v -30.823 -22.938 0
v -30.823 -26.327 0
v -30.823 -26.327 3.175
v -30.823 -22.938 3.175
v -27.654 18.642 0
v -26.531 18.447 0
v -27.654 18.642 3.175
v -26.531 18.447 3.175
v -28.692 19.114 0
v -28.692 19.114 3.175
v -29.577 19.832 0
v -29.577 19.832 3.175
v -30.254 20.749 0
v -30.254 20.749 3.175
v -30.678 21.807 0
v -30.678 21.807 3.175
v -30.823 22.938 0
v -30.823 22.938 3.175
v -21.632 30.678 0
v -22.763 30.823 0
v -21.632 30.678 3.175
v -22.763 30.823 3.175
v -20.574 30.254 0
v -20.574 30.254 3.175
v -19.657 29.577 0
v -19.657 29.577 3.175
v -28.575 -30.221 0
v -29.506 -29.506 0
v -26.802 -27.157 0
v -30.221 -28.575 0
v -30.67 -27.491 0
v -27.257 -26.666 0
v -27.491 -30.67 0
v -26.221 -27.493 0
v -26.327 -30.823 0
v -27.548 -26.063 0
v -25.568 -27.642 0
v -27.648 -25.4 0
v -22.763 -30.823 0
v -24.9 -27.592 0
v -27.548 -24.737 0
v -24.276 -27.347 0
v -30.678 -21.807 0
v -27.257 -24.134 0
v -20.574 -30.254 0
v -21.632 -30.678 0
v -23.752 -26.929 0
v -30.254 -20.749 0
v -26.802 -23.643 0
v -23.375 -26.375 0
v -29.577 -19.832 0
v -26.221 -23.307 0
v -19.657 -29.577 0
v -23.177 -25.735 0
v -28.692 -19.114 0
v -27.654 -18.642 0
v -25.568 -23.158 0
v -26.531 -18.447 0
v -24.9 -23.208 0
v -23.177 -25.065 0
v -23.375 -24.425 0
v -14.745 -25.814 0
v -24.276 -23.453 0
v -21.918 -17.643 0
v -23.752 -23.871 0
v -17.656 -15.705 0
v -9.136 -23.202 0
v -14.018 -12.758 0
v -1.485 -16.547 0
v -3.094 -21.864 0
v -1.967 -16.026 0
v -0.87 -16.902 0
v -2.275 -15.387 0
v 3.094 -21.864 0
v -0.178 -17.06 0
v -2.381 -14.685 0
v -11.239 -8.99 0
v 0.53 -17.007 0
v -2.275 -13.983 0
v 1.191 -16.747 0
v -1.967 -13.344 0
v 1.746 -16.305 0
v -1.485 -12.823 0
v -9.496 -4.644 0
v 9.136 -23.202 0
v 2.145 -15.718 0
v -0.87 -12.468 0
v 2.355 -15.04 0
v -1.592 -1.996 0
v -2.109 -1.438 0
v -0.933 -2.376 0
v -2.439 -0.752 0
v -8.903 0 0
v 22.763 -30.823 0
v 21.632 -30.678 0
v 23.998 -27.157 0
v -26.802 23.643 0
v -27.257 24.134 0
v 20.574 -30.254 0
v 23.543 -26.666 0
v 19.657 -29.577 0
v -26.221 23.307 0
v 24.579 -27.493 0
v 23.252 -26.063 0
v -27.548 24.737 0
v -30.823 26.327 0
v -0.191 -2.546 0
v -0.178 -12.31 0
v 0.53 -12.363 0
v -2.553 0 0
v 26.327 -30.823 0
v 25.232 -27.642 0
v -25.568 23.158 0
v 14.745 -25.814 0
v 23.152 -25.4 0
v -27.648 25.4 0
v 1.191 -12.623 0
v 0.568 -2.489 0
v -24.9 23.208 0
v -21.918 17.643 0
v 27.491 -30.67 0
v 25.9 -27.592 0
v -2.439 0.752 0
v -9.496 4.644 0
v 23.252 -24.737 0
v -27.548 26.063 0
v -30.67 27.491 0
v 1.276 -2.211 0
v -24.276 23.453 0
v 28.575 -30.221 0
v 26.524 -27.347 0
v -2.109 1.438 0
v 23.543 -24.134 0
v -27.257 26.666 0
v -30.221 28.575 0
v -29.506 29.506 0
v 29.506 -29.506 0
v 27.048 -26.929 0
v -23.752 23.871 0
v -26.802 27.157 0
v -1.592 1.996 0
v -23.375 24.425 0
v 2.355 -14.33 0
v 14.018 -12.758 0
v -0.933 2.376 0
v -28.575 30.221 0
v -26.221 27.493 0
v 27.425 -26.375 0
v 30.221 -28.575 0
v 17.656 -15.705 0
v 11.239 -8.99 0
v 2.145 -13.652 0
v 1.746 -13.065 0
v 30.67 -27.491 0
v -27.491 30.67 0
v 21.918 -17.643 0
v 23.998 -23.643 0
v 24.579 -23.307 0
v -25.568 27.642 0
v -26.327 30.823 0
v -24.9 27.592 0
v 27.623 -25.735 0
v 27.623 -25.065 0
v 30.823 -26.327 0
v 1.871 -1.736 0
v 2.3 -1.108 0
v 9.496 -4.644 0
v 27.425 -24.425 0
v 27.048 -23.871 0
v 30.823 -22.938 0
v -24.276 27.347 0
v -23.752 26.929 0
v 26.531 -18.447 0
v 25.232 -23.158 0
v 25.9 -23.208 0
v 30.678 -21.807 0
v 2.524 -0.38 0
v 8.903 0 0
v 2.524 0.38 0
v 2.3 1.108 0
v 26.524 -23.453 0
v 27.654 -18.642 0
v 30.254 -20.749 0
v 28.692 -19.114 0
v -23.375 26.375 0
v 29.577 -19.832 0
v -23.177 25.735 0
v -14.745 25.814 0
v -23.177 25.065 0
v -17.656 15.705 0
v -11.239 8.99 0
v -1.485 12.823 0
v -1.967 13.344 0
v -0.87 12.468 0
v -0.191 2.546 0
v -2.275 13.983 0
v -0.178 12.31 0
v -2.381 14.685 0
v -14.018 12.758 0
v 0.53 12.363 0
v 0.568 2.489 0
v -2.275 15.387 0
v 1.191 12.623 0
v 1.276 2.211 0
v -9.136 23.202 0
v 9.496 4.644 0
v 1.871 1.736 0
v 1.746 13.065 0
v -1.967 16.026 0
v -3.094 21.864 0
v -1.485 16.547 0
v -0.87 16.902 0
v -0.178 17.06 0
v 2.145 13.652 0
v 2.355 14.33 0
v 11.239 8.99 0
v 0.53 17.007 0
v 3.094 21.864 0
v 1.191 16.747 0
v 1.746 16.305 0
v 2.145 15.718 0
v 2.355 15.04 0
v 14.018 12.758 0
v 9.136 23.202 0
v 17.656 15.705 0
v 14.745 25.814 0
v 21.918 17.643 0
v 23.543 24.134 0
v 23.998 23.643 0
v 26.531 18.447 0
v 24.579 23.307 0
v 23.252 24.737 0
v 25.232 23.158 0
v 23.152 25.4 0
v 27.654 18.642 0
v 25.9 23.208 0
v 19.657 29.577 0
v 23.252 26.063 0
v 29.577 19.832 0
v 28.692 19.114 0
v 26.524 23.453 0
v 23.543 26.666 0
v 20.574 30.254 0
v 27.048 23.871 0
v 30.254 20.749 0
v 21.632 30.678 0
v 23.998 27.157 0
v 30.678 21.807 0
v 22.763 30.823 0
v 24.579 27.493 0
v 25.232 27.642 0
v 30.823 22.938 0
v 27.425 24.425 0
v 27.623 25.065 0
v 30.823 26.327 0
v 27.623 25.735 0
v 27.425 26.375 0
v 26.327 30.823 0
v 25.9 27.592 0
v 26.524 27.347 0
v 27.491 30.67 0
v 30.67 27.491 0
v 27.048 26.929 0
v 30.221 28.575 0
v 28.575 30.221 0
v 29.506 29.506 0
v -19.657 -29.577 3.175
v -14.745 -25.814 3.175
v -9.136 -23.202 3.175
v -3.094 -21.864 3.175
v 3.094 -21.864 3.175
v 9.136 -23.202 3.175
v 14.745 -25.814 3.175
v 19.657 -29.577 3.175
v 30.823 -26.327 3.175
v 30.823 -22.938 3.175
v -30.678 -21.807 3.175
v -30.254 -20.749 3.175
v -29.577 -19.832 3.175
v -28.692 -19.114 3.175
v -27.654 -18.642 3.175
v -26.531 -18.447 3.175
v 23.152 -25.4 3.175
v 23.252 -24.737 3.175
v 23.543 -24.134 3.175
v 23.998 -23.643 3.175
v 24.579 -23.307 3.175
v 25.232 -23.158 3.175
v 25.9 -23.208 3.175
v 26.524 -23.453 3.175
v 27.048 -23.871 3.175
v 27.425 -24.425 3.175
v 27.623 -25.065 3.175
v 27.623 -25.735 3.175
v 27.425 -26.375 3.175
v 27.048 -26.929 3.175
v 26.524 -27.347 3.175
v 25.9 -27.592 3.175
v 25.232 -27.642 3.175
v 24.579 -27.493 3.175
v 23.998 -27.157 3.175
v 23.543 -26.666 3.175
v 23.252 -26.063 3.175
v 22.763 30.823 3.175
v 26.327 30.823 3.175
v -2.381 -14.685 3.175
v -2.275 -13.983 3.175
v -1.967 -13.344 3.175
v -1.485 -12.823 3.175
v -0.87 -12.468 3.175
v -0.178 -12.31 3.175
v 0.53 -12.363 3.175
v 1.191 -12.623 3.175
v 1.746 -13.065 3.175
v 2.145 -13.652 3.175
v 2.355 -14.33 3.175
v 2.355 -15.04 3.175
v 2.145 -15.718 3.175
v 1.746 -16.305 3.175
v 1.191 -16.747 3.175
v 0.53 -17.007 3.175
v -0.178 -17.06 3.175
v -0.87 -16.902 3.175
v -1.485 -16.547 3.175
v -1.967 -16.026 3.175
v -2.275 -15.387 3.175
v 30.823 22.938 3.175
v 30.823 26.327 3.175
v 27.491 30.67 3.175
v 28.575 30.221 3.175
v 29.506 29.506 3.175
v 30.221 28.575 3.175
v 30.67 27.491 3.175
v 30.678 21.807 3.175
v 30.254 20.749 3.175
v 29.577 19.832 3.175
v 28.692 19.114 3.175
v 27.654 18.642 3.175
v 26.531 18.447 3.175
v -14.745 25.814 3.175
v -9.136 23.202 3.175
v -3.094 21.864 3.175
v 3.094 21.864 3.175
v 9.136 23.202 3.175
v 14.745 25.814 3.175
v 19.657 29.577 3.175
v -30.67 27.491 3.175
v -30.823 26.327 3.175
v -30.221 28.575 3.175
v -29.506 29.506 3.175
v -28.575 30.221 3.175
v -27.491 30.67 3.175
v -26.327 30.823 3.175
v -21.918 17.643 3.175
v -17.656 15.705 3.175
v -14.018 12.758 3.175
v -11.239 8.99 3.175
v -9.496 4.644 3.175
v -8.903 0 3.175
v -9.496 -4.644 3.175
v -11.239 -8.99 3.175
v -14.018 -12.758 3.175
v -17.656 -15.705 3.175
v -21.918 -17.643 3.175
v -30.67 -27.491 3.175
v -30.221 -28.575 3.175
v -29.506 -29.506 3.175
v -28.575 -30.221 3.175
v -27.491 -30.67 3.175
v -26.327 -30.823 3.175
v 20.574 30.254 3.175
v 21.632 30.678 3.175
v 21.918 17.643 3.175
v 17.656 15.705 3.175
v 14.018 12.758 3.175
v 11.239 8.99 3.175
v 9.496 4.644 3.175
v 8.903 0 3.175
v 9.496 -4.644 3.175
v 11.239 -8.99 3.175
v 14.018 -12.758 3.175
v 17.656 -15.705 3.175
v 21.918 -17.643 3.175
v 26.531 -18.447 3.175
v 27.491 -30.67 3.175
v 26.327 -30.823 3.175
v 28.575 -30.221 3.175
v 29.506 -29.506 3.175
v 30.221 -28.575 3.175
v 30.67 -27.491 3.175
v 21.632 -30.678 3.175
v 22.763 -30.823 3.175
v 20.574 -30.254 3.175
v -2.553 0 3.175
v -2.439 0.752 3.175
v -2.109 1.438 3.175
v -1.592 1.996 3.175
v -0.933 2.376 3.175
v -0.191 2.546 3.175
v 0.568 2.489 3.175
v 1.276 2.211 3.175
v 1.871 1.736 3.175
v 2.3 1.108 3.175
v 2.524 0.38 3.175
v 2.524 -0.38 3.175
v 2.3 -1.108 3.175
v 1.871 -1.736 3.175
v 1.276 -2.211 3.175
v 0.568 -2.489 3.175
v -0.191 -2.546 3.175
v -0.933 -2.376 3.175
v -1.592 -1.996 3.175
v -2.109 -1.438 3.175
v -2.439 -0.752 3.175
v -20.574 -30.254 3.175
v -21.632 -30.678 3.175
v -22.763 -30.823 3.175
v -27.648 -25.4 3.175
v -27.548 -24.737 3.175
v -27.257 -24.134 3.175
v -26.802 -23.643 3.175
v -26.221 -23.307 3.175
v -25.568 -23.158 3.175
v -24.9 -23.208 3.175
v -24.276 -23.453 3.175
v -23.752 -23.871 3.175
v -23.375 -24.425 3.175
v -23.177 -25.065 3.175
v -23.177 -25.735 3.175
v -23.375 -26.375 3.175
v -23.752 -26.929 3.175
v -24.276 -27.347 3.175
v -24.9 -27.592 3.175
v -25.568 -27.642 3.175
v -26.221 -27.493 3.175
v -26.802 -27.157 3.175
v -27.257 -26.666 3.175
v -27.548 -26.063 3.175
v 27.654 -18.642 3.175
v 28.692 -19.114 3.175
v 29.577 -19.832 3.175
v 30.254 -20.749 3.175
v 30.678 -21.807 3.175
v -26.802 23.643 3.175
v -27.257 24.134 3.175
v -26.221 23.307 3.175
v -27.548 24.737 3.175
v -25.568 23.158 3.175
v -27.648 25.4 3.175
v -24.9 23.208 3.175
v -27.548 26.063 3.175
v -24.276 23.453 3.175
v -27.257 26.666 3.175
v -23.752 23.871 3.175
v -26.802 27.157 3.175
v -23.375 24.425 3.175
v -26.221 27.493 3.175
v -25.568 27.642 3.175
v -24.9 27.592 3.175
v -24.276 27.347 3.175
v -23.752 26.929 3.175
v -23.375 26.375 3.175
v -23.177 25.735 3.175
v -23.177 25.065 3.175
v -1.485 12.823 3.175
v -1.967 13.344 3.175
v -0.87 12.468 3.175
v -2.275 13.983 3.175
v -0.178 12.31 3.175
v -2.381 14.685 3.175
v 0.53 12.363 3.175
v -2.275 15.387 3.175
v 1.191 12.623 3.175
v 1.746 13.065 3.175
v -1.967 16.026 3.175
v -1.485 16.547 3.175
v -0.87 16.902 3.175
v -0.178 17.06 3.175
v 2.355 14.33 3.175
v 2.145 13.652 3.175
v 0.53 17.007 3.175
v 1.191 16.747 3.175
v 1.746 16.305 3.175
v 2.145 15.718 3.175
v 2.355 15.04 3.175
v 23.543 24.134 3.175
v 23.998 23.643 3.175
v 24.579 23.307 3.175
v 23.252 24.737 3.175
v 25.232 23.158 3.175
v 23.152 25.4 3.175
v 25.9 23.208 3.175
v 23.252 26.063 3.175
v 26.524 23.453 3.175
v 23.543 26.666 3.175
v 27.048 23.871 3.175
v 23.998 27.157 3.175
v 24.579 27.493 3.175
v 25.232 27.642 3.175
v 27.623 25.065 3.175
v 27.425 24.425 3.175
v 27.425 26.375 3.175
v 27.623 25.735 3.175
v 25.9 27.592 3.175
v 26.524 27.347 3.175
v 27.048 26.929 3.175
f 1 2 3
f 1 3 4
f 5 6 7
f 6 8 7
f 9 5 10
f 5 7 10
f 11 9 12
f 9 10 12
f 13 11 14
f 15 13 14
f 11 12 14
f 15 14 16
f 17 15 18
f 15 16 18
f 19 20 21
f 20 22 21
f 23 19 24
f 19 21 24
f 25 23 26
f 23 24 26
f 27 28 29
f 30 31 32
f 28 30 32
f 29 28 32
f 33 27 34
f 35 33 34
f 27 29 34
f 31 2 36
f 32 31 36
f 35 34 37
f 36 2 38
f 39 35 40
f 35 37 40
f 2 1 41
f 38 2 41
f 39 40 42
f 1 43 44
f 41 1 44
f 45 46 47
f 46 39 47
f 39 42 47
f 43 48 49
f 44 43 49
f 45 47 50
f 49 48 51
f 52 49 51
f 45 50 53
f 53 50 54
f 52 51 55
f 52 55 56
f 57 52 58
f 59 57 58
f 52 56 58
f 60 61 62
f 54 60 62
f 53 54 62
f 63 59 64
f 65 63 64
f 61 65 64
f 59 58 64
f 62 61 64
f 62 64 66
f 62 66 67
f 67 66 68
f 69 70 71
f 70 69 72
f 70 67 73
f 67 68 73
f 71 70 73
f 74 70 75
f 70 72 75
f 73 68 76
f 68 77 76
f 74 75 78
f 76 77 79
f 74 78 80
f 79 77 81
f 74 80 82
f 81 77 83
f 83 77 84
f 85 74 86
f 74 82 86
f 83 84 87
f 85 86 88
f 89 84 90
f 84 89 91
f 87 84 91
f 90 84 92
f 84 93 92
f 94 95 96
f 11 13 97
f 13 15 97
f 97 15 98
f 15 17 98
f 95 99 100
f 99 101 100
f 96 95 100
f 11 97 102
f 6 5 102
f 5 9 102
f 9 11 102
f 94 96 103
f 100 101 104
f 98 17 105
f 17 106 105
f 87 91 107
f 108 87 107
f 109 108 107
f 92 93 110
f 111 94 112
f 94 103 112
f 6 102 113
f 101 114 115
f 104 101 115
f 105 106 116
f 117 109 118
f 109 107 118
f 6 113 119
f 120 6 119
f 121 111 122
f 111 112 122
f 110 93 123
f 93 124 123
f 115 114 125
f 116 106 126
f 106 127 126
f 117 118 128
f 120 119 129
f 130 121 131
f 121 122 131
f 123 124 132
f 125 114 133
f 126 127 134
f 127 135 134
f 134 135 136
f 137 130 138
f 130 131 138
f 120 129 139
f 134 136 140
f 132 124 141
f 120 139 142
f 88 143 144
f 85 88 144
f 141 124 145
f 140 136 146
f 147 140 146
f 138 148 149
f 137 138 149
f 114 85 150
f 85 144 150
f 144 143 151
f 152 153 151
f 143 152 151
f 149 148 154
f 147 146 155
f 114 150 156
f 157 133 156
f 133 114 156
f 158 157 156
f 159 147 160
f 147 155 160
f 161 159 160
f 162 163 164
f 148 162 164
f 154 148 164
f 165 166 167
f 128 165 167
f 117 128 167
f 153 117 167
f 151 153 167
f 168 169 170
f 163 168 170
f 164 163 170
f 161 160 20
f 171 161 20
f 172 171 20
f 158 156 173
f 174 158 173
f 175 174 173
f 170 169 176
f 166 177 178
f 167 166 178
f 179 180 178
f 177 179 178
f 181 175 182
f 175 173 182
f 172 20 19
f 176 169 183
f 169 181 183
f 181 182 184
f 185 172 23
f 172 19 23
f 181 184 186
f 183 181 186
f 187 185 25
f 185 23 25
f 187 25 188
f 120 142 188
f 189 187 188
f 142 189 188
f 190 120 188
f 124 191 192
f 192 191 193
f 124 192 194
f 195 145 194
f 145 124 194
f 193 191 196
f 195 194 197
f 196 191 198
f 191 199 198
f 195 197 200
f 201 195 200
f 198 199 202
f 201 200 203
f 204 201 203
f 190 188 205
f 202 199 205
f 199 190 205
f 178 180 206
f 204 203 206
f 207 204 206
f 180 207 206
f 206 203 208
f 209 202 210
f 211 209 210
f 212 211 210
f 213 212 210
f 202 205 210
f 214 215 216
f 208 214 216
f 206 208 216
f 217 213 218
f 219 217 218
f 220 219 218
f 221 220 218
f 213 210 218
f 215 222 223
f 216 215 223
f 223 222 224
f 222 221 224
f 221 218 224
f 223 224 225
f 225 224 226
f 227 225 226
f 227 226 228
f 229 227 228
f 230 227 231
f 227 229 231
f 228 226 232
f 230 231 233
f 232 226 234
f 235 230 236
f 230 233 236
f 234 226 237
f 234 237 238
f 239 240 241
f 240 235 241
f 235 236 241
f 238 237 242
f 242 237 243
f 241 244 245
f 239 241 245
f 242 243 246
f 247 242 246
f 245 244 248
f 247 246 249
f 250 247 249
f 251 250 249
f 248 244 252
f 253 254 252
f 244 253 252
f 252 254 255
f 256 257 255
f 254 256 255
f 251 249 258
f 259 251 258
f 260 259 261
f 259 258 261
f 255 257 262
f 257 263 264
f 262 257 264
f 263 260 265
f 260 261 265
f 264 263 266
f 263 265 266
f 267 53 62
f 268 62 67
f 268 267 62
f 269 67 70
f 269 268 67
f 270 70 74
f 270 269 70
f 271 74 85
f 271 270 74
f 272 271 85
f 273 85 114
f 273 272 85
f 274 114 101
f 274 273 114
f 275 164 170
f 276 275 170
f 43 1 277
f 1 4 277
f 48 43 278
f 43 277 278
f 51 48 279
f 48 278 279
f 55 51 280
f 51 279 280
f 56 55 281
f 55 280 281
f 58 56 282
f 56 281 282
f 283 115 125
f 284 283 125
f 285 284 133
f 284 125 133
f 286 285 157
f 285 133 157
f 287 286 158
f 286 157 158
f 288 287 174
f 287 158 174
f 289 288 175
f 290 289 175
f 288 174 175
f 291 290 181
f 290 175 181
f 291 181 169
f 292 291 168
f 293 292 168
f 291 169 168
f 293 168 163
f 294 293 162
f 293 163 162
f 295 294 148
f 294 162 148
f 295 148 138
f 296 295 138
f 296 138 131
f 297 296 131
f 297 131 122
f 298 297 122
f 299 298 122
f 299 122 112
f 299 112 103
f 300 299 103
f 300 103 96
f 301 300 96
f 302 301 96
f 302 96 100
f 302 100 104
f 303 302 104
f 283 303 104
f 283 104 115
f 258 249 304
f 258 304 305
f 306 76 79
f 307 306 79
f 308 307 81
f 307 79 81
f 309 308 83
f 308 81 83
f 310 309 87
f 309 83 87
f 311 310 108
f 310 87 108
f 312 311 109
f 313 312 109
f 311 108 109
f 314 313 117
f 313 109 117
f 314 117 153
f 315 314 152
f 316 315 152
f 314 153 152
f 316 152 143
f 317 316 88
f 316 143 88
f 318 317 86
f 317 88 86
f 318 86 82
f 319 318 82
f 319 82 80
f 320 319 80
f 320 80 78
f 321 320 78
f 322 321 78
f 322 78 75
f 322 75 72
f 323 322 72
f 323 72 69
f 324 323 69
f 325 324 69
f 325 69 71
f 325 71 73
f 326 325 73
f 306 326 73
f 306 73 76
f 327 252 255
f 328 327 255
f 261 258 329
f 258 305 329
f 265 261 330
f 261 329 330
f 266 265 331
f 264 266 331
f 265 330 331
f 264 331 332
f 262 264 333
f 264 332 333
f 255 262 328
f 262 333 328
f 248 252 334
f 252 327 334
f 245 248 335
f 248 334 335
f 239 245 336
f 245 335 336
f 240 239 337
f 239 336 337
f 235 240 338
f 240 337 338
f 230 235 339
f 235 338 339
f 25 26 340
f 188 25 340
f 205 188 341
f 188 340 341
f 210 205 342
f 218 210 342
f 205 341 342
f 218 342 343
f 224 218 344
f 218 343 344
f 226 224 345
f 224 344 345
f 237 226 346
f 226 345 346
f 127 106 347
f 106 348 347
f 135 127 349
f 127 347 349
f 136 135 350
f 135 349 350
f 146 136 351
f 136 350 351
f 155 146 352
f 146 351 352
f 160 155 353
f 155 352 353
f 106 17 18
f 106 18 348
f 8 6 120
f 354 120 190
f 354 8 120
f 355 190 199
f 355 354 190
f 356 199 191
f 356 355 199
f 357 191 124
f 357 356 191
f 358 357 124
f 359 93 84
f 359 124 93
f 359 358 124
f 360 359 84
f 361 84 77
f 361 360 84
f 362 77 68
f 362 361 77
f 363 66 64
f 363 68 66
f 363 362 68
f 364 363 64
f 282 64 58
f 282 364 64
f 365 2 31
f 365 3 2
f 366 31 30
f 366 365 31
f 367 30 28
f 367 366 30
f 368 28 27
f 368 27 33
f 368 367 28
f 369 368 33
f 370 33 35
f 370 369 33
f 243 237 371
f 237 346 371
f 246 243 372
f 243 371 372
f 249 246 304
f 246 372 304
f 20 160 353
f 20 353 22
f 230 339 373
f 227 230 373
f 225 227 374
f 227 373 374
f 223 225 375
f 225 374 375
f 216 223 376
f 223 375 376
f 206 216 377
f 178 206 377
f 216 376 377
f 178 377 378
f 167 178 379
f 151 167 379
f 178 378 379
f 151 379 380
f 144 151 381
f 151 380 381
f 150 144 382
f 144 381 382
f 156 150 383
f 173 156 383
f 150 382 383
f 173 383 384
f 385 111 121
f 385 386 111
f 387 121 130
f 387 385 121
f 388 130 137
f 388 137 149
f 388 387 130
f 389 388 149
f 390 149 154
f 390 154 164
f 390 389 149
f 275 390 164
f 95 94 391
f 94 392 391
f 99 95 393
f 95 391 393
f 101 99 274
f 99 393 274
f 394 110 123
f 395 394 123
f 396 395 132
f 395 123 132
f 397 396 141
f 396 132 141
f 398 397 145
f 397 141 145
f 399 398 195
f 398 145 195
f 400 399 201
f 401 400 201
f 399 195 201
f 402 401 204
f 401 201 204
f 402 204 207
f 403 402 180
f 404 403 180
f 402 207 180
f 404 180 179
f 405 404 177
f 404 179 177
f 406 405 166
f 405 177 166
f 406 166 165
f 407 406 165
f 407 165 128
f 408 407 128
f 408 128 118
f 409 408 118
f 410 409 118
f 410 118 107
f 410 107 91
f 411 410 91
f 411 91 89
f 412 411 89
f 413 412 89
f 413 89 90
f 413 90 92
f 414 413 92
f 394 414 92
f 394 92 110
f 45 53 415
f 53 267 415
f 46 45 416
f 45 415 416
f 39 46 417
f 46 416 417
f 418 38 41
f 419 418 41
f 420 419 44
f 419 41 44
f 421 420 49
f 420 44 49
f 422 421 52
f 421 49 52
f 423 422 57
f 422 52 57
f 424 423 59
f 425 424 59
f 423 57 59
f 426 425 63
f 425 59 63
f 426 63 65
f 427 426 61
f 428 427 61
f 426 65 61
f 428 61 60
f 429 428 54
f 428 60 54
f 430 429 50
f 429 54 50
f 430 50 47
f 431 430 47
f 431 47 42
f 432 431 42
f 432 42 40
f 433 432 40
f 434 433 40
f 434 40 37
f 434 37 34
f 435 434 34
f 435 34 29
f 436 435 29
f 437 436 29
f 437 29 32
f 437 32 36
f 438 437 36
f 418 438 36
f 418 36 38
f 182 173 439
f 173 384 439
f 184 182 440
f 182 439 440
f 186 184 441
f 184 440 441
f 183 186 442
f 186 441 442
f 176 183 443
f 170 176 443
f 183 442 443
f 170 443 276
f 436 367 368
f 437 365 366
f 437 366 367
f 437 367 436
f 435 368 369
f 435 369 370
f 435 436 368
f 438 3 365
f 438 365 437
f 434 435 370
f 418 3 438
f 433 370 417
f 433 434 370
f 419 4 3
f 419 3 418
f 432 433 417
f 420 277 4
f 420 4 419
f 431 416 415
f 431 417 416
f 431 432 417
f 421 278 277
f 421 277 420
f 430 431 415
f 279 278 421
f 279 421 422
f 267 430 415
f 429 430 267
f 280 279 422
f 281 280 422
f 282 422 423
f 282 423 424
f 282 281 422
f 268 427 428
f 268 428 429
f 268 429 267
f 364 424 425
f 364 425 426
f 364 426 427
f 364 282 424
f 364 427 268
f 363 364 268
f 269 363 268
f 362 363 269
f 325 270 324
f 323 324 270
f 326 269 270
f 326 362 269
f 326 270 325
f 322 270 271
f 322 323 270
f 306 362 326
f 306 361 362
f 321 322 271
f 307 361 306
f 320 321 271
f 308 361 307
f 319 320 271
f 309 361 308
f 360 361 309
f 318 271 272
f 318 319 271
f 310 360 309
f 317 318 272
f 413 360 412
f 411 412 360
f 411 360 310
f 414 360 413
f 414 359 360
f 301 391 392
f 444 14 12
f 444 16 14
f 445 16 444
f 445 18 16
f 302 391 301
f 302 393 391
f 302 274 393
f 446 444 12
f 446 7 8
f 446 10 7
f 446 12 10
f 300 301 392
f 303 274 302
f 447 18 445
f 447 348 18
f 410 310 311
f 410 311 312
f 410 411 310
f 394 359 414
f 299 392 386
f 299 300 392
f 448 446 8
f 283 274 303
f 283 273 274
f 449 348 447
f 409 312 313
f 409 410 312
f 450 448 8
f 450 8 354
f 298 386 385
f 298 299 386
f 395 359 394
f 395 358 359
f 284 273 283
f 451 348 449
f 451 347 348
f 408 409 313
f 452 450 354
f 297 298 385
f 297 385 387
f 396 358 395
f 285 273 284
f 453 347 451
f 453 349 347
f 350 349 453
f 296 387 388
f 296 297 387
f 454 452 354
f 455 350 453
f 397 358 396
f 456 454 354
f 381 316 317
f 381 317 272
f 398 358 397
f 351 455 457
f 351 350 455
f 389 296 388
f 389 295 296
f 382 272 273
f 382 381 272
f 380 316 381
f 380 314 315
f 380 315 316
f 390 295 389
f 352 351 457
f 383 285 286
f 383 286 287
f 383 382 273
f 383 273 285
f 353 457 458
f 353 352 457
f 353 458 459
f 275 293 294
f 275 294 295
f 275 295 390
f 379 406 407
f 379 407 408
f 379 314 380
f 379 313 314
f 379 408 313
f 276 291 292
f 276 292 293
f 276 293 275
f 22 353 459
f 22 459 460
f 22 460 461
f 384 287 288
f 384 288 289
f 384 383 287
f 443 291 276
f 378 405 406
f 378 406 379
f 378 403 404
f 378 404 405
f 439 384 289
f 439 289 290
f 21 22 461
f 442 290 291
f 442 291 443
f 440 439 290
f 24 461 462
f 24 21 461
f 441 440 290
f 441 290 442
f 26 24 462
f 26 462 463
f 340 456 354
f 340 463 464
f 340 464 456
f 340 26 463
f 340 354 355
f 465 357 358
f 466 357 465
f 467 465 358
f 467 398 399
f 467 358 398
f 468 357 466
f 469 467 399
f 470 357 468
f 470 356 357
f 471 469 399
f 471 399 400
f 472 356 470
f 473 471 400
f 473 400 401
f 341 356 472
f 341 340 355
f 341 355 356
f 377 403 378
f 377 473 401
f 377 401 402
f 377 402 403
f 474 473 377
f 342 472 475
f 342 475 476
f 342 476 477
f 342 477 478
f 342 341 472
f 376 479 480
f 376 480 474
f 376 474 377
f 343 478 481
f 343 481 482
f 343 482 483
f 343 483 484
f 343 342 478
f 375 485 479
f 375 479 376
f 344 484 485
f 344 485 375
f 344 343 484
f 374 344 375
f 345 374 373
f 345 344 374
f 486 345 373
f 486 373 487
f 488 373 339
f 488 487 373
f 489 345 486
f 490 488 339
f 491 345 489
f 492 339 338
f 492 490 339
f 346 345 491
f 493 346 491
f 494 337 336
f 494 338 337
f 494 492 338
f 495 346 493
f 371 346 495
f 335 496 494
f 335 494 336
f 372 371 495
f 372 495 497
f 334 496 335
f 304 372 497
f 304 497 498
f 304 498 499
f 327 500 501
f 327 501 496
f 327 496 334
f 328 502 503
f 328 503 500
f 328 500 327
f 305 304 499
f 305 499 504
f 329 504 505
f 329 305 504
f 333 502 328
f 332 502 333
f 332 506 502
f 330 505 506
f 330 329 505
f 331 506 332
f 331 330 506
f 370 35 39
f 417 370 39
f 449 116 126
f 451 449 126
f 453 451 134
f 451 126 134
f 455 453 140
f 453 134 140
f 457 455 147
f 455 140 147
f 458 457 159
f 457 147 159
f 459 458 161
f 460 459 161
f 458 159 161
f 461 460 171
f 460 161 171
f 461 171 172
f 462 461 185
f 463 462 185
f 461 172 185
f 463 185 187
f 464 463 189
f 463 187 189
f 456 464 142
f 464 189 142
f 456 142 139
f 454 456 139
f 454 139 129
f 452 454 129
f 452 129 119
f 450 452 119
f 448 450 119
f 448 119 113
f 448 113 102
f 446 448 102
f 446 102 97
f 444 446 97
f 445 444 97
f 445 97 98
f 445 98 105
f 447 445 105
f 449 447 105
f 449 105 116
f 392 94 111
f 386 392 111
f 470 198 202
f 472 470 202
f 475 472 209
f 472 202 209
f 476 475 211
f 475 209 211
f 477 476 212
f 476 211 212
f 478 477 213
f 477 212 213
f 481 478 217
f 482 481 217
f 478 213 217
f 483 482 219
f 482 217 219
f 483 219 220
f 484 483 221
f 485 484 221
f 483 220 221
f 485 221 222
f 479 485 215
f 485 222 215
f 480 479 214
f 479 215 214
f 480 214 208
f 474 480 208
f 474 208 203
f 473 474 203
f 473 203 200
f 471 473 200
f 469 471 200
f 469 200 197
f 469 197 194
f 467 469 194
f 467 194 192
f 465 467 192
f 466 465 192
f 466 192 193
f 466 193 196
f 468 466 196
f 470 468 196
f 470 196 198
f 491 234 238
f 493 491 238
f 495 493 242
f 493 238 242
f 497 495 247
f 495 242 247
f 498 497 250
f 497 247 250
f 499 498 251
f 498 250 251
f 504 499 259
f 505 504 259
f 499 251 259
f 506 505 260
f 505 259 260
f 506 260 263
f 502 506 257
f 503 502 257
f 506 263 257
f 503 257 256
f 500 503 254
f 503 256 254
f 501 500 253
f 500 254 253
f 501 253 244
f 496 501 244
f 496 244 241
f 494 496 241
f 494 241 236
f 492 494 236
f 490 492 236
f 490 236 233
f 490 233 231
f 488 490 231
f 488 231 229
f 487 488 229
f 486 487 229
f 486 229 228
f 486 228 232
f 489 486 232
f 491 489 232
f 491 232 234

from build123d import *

# Parameters (mm, degrees)
SKETCH1_W                      = 61.6458
SKETCH1_H                      = 61.6458
BOSS_EXTRUDE1_DEPTH            = 3.175
F_3_16_0_1875_DIAMETER_HOLE1_D = 4.7625
F_8_CLEARANCE_HOLE1_D          = 4.4958
F_10_CLEARANCE_HOLE2_D         = 5.1054
FILLET1_R                      = 4.4958
SKETCH9_R                      = 28.452559636
CUT_EXTRUDE2_DEPTH             = 4.175
SKETCH9_4_R                    = 18.465762264
CUT_EXTRUDE3_DEPTH             = 4.175
FILLET3_R                      = 4.4958


with BuildPart() as part:
    # Sketch1 → Boss-Extrude1 (new body)
    with BuildSketch(Plane.XY):
        Rectangle(SKETCH1_W, SKETCH1_H)
    extrude(amount=BOSS_EXTRUDE1_DEPTH)

    # 3/16 (0.1875) Diameter Hole1 (through all)
    with Locations(Plane.XY.offset(3.175)):
        with Locations((0, -14.685), (0, 14.685)):
            Hole(F_3_16_0_1875_DIAMETER_HOLE1_D / 2)

    # #8 Clearance Hole1 (through all)
    with Locations(Plane.XY.offset(3.175)):
        with Locations((-25.4, 25.4), (-25.4, -25.4), (25.4, -25.4), (25.4, 25.4)):
            Hole(F_8_CLEARANCE_HOLE1_D / 2)

    # #10 Clearance Hole2 (through all)
    with Locations(Plane.XY.offset(3.175)):
        with Locations((0, 0)):
            Hole(F_10_CLEARANCE_HOLE2_D / 2)

    # Fillet1
    fillet1_edges = [part.edges().sort_by_distance(p)[0] for p in [
        (-30.8229, 30.8229, 1.5875),
        (30.8229, 30.8229, 1.5875),
        (30.8229, -30.8229, 1.5875),
        (-30.8229, -30.8229, 1.5875),
    ]]
    fillet(fillet1_edges, radius=FILLET1_R)

    # Sketch9 → Cut-Extrude2 (cut, through all)
    with BuildSketch(Plane.XY.offset(3.175)):
        with Locations((0, 50.147959636)):
            Circle(SKETCH9_R)
    cut_extrude2 = extrude(amount=-CUT_EXTRUDE2_DEPTH, mode=Mode.SUBTRACT)

    # Sketch9<4> → Cut-Extrude3 (cut, through all)
    with BuildSketch(Plane.XY.offset(3.175)):
        with Locations((27.368462264, 0)):
            Circle(SKETCH9_4_R)
    cut_extrude3 = extrude(amount=-CUT_EXTRUDE3_DEPTH, mode=Mode.SUBTRACT)

    # Mirror1: Cut-Extrude2 across plane
    add(cut_extrude2.mirror(Plane.ZX), mode=Mode.SUBTRACT)

    # Mirror2: Cut-Extrude3 across plane
    add(cut_extrude3.mirror(Plane(origin=(0, 0, 0), x_dir=(0, 0, 1), z_dir=(1, 0, 0))), mode=Mode.SUBTRACT)

    # Fillet3
    fillet3_edges = [part.edges().sort_by_distance(p)[0] for p in [
        (-30.8229, 18.139769456, 1.5875),
        (-30.8229, -18.139769456, 1.5875),
        (20.882773281, 30.8229, 1.5875),
        (-20.882773281, 30.8229, 1.5875),
        (30.8229, -18.139769456, 1.5875),
        (30.8229, 18.139769456, 1.5875),
        (-20.882773281, -30.8229, 1.5875),
        (20.882773281, -30.8229, 1.5875),
    ]]
    fillet(fillet3_edges, radius=FILLET3_R)


solid = part.part
